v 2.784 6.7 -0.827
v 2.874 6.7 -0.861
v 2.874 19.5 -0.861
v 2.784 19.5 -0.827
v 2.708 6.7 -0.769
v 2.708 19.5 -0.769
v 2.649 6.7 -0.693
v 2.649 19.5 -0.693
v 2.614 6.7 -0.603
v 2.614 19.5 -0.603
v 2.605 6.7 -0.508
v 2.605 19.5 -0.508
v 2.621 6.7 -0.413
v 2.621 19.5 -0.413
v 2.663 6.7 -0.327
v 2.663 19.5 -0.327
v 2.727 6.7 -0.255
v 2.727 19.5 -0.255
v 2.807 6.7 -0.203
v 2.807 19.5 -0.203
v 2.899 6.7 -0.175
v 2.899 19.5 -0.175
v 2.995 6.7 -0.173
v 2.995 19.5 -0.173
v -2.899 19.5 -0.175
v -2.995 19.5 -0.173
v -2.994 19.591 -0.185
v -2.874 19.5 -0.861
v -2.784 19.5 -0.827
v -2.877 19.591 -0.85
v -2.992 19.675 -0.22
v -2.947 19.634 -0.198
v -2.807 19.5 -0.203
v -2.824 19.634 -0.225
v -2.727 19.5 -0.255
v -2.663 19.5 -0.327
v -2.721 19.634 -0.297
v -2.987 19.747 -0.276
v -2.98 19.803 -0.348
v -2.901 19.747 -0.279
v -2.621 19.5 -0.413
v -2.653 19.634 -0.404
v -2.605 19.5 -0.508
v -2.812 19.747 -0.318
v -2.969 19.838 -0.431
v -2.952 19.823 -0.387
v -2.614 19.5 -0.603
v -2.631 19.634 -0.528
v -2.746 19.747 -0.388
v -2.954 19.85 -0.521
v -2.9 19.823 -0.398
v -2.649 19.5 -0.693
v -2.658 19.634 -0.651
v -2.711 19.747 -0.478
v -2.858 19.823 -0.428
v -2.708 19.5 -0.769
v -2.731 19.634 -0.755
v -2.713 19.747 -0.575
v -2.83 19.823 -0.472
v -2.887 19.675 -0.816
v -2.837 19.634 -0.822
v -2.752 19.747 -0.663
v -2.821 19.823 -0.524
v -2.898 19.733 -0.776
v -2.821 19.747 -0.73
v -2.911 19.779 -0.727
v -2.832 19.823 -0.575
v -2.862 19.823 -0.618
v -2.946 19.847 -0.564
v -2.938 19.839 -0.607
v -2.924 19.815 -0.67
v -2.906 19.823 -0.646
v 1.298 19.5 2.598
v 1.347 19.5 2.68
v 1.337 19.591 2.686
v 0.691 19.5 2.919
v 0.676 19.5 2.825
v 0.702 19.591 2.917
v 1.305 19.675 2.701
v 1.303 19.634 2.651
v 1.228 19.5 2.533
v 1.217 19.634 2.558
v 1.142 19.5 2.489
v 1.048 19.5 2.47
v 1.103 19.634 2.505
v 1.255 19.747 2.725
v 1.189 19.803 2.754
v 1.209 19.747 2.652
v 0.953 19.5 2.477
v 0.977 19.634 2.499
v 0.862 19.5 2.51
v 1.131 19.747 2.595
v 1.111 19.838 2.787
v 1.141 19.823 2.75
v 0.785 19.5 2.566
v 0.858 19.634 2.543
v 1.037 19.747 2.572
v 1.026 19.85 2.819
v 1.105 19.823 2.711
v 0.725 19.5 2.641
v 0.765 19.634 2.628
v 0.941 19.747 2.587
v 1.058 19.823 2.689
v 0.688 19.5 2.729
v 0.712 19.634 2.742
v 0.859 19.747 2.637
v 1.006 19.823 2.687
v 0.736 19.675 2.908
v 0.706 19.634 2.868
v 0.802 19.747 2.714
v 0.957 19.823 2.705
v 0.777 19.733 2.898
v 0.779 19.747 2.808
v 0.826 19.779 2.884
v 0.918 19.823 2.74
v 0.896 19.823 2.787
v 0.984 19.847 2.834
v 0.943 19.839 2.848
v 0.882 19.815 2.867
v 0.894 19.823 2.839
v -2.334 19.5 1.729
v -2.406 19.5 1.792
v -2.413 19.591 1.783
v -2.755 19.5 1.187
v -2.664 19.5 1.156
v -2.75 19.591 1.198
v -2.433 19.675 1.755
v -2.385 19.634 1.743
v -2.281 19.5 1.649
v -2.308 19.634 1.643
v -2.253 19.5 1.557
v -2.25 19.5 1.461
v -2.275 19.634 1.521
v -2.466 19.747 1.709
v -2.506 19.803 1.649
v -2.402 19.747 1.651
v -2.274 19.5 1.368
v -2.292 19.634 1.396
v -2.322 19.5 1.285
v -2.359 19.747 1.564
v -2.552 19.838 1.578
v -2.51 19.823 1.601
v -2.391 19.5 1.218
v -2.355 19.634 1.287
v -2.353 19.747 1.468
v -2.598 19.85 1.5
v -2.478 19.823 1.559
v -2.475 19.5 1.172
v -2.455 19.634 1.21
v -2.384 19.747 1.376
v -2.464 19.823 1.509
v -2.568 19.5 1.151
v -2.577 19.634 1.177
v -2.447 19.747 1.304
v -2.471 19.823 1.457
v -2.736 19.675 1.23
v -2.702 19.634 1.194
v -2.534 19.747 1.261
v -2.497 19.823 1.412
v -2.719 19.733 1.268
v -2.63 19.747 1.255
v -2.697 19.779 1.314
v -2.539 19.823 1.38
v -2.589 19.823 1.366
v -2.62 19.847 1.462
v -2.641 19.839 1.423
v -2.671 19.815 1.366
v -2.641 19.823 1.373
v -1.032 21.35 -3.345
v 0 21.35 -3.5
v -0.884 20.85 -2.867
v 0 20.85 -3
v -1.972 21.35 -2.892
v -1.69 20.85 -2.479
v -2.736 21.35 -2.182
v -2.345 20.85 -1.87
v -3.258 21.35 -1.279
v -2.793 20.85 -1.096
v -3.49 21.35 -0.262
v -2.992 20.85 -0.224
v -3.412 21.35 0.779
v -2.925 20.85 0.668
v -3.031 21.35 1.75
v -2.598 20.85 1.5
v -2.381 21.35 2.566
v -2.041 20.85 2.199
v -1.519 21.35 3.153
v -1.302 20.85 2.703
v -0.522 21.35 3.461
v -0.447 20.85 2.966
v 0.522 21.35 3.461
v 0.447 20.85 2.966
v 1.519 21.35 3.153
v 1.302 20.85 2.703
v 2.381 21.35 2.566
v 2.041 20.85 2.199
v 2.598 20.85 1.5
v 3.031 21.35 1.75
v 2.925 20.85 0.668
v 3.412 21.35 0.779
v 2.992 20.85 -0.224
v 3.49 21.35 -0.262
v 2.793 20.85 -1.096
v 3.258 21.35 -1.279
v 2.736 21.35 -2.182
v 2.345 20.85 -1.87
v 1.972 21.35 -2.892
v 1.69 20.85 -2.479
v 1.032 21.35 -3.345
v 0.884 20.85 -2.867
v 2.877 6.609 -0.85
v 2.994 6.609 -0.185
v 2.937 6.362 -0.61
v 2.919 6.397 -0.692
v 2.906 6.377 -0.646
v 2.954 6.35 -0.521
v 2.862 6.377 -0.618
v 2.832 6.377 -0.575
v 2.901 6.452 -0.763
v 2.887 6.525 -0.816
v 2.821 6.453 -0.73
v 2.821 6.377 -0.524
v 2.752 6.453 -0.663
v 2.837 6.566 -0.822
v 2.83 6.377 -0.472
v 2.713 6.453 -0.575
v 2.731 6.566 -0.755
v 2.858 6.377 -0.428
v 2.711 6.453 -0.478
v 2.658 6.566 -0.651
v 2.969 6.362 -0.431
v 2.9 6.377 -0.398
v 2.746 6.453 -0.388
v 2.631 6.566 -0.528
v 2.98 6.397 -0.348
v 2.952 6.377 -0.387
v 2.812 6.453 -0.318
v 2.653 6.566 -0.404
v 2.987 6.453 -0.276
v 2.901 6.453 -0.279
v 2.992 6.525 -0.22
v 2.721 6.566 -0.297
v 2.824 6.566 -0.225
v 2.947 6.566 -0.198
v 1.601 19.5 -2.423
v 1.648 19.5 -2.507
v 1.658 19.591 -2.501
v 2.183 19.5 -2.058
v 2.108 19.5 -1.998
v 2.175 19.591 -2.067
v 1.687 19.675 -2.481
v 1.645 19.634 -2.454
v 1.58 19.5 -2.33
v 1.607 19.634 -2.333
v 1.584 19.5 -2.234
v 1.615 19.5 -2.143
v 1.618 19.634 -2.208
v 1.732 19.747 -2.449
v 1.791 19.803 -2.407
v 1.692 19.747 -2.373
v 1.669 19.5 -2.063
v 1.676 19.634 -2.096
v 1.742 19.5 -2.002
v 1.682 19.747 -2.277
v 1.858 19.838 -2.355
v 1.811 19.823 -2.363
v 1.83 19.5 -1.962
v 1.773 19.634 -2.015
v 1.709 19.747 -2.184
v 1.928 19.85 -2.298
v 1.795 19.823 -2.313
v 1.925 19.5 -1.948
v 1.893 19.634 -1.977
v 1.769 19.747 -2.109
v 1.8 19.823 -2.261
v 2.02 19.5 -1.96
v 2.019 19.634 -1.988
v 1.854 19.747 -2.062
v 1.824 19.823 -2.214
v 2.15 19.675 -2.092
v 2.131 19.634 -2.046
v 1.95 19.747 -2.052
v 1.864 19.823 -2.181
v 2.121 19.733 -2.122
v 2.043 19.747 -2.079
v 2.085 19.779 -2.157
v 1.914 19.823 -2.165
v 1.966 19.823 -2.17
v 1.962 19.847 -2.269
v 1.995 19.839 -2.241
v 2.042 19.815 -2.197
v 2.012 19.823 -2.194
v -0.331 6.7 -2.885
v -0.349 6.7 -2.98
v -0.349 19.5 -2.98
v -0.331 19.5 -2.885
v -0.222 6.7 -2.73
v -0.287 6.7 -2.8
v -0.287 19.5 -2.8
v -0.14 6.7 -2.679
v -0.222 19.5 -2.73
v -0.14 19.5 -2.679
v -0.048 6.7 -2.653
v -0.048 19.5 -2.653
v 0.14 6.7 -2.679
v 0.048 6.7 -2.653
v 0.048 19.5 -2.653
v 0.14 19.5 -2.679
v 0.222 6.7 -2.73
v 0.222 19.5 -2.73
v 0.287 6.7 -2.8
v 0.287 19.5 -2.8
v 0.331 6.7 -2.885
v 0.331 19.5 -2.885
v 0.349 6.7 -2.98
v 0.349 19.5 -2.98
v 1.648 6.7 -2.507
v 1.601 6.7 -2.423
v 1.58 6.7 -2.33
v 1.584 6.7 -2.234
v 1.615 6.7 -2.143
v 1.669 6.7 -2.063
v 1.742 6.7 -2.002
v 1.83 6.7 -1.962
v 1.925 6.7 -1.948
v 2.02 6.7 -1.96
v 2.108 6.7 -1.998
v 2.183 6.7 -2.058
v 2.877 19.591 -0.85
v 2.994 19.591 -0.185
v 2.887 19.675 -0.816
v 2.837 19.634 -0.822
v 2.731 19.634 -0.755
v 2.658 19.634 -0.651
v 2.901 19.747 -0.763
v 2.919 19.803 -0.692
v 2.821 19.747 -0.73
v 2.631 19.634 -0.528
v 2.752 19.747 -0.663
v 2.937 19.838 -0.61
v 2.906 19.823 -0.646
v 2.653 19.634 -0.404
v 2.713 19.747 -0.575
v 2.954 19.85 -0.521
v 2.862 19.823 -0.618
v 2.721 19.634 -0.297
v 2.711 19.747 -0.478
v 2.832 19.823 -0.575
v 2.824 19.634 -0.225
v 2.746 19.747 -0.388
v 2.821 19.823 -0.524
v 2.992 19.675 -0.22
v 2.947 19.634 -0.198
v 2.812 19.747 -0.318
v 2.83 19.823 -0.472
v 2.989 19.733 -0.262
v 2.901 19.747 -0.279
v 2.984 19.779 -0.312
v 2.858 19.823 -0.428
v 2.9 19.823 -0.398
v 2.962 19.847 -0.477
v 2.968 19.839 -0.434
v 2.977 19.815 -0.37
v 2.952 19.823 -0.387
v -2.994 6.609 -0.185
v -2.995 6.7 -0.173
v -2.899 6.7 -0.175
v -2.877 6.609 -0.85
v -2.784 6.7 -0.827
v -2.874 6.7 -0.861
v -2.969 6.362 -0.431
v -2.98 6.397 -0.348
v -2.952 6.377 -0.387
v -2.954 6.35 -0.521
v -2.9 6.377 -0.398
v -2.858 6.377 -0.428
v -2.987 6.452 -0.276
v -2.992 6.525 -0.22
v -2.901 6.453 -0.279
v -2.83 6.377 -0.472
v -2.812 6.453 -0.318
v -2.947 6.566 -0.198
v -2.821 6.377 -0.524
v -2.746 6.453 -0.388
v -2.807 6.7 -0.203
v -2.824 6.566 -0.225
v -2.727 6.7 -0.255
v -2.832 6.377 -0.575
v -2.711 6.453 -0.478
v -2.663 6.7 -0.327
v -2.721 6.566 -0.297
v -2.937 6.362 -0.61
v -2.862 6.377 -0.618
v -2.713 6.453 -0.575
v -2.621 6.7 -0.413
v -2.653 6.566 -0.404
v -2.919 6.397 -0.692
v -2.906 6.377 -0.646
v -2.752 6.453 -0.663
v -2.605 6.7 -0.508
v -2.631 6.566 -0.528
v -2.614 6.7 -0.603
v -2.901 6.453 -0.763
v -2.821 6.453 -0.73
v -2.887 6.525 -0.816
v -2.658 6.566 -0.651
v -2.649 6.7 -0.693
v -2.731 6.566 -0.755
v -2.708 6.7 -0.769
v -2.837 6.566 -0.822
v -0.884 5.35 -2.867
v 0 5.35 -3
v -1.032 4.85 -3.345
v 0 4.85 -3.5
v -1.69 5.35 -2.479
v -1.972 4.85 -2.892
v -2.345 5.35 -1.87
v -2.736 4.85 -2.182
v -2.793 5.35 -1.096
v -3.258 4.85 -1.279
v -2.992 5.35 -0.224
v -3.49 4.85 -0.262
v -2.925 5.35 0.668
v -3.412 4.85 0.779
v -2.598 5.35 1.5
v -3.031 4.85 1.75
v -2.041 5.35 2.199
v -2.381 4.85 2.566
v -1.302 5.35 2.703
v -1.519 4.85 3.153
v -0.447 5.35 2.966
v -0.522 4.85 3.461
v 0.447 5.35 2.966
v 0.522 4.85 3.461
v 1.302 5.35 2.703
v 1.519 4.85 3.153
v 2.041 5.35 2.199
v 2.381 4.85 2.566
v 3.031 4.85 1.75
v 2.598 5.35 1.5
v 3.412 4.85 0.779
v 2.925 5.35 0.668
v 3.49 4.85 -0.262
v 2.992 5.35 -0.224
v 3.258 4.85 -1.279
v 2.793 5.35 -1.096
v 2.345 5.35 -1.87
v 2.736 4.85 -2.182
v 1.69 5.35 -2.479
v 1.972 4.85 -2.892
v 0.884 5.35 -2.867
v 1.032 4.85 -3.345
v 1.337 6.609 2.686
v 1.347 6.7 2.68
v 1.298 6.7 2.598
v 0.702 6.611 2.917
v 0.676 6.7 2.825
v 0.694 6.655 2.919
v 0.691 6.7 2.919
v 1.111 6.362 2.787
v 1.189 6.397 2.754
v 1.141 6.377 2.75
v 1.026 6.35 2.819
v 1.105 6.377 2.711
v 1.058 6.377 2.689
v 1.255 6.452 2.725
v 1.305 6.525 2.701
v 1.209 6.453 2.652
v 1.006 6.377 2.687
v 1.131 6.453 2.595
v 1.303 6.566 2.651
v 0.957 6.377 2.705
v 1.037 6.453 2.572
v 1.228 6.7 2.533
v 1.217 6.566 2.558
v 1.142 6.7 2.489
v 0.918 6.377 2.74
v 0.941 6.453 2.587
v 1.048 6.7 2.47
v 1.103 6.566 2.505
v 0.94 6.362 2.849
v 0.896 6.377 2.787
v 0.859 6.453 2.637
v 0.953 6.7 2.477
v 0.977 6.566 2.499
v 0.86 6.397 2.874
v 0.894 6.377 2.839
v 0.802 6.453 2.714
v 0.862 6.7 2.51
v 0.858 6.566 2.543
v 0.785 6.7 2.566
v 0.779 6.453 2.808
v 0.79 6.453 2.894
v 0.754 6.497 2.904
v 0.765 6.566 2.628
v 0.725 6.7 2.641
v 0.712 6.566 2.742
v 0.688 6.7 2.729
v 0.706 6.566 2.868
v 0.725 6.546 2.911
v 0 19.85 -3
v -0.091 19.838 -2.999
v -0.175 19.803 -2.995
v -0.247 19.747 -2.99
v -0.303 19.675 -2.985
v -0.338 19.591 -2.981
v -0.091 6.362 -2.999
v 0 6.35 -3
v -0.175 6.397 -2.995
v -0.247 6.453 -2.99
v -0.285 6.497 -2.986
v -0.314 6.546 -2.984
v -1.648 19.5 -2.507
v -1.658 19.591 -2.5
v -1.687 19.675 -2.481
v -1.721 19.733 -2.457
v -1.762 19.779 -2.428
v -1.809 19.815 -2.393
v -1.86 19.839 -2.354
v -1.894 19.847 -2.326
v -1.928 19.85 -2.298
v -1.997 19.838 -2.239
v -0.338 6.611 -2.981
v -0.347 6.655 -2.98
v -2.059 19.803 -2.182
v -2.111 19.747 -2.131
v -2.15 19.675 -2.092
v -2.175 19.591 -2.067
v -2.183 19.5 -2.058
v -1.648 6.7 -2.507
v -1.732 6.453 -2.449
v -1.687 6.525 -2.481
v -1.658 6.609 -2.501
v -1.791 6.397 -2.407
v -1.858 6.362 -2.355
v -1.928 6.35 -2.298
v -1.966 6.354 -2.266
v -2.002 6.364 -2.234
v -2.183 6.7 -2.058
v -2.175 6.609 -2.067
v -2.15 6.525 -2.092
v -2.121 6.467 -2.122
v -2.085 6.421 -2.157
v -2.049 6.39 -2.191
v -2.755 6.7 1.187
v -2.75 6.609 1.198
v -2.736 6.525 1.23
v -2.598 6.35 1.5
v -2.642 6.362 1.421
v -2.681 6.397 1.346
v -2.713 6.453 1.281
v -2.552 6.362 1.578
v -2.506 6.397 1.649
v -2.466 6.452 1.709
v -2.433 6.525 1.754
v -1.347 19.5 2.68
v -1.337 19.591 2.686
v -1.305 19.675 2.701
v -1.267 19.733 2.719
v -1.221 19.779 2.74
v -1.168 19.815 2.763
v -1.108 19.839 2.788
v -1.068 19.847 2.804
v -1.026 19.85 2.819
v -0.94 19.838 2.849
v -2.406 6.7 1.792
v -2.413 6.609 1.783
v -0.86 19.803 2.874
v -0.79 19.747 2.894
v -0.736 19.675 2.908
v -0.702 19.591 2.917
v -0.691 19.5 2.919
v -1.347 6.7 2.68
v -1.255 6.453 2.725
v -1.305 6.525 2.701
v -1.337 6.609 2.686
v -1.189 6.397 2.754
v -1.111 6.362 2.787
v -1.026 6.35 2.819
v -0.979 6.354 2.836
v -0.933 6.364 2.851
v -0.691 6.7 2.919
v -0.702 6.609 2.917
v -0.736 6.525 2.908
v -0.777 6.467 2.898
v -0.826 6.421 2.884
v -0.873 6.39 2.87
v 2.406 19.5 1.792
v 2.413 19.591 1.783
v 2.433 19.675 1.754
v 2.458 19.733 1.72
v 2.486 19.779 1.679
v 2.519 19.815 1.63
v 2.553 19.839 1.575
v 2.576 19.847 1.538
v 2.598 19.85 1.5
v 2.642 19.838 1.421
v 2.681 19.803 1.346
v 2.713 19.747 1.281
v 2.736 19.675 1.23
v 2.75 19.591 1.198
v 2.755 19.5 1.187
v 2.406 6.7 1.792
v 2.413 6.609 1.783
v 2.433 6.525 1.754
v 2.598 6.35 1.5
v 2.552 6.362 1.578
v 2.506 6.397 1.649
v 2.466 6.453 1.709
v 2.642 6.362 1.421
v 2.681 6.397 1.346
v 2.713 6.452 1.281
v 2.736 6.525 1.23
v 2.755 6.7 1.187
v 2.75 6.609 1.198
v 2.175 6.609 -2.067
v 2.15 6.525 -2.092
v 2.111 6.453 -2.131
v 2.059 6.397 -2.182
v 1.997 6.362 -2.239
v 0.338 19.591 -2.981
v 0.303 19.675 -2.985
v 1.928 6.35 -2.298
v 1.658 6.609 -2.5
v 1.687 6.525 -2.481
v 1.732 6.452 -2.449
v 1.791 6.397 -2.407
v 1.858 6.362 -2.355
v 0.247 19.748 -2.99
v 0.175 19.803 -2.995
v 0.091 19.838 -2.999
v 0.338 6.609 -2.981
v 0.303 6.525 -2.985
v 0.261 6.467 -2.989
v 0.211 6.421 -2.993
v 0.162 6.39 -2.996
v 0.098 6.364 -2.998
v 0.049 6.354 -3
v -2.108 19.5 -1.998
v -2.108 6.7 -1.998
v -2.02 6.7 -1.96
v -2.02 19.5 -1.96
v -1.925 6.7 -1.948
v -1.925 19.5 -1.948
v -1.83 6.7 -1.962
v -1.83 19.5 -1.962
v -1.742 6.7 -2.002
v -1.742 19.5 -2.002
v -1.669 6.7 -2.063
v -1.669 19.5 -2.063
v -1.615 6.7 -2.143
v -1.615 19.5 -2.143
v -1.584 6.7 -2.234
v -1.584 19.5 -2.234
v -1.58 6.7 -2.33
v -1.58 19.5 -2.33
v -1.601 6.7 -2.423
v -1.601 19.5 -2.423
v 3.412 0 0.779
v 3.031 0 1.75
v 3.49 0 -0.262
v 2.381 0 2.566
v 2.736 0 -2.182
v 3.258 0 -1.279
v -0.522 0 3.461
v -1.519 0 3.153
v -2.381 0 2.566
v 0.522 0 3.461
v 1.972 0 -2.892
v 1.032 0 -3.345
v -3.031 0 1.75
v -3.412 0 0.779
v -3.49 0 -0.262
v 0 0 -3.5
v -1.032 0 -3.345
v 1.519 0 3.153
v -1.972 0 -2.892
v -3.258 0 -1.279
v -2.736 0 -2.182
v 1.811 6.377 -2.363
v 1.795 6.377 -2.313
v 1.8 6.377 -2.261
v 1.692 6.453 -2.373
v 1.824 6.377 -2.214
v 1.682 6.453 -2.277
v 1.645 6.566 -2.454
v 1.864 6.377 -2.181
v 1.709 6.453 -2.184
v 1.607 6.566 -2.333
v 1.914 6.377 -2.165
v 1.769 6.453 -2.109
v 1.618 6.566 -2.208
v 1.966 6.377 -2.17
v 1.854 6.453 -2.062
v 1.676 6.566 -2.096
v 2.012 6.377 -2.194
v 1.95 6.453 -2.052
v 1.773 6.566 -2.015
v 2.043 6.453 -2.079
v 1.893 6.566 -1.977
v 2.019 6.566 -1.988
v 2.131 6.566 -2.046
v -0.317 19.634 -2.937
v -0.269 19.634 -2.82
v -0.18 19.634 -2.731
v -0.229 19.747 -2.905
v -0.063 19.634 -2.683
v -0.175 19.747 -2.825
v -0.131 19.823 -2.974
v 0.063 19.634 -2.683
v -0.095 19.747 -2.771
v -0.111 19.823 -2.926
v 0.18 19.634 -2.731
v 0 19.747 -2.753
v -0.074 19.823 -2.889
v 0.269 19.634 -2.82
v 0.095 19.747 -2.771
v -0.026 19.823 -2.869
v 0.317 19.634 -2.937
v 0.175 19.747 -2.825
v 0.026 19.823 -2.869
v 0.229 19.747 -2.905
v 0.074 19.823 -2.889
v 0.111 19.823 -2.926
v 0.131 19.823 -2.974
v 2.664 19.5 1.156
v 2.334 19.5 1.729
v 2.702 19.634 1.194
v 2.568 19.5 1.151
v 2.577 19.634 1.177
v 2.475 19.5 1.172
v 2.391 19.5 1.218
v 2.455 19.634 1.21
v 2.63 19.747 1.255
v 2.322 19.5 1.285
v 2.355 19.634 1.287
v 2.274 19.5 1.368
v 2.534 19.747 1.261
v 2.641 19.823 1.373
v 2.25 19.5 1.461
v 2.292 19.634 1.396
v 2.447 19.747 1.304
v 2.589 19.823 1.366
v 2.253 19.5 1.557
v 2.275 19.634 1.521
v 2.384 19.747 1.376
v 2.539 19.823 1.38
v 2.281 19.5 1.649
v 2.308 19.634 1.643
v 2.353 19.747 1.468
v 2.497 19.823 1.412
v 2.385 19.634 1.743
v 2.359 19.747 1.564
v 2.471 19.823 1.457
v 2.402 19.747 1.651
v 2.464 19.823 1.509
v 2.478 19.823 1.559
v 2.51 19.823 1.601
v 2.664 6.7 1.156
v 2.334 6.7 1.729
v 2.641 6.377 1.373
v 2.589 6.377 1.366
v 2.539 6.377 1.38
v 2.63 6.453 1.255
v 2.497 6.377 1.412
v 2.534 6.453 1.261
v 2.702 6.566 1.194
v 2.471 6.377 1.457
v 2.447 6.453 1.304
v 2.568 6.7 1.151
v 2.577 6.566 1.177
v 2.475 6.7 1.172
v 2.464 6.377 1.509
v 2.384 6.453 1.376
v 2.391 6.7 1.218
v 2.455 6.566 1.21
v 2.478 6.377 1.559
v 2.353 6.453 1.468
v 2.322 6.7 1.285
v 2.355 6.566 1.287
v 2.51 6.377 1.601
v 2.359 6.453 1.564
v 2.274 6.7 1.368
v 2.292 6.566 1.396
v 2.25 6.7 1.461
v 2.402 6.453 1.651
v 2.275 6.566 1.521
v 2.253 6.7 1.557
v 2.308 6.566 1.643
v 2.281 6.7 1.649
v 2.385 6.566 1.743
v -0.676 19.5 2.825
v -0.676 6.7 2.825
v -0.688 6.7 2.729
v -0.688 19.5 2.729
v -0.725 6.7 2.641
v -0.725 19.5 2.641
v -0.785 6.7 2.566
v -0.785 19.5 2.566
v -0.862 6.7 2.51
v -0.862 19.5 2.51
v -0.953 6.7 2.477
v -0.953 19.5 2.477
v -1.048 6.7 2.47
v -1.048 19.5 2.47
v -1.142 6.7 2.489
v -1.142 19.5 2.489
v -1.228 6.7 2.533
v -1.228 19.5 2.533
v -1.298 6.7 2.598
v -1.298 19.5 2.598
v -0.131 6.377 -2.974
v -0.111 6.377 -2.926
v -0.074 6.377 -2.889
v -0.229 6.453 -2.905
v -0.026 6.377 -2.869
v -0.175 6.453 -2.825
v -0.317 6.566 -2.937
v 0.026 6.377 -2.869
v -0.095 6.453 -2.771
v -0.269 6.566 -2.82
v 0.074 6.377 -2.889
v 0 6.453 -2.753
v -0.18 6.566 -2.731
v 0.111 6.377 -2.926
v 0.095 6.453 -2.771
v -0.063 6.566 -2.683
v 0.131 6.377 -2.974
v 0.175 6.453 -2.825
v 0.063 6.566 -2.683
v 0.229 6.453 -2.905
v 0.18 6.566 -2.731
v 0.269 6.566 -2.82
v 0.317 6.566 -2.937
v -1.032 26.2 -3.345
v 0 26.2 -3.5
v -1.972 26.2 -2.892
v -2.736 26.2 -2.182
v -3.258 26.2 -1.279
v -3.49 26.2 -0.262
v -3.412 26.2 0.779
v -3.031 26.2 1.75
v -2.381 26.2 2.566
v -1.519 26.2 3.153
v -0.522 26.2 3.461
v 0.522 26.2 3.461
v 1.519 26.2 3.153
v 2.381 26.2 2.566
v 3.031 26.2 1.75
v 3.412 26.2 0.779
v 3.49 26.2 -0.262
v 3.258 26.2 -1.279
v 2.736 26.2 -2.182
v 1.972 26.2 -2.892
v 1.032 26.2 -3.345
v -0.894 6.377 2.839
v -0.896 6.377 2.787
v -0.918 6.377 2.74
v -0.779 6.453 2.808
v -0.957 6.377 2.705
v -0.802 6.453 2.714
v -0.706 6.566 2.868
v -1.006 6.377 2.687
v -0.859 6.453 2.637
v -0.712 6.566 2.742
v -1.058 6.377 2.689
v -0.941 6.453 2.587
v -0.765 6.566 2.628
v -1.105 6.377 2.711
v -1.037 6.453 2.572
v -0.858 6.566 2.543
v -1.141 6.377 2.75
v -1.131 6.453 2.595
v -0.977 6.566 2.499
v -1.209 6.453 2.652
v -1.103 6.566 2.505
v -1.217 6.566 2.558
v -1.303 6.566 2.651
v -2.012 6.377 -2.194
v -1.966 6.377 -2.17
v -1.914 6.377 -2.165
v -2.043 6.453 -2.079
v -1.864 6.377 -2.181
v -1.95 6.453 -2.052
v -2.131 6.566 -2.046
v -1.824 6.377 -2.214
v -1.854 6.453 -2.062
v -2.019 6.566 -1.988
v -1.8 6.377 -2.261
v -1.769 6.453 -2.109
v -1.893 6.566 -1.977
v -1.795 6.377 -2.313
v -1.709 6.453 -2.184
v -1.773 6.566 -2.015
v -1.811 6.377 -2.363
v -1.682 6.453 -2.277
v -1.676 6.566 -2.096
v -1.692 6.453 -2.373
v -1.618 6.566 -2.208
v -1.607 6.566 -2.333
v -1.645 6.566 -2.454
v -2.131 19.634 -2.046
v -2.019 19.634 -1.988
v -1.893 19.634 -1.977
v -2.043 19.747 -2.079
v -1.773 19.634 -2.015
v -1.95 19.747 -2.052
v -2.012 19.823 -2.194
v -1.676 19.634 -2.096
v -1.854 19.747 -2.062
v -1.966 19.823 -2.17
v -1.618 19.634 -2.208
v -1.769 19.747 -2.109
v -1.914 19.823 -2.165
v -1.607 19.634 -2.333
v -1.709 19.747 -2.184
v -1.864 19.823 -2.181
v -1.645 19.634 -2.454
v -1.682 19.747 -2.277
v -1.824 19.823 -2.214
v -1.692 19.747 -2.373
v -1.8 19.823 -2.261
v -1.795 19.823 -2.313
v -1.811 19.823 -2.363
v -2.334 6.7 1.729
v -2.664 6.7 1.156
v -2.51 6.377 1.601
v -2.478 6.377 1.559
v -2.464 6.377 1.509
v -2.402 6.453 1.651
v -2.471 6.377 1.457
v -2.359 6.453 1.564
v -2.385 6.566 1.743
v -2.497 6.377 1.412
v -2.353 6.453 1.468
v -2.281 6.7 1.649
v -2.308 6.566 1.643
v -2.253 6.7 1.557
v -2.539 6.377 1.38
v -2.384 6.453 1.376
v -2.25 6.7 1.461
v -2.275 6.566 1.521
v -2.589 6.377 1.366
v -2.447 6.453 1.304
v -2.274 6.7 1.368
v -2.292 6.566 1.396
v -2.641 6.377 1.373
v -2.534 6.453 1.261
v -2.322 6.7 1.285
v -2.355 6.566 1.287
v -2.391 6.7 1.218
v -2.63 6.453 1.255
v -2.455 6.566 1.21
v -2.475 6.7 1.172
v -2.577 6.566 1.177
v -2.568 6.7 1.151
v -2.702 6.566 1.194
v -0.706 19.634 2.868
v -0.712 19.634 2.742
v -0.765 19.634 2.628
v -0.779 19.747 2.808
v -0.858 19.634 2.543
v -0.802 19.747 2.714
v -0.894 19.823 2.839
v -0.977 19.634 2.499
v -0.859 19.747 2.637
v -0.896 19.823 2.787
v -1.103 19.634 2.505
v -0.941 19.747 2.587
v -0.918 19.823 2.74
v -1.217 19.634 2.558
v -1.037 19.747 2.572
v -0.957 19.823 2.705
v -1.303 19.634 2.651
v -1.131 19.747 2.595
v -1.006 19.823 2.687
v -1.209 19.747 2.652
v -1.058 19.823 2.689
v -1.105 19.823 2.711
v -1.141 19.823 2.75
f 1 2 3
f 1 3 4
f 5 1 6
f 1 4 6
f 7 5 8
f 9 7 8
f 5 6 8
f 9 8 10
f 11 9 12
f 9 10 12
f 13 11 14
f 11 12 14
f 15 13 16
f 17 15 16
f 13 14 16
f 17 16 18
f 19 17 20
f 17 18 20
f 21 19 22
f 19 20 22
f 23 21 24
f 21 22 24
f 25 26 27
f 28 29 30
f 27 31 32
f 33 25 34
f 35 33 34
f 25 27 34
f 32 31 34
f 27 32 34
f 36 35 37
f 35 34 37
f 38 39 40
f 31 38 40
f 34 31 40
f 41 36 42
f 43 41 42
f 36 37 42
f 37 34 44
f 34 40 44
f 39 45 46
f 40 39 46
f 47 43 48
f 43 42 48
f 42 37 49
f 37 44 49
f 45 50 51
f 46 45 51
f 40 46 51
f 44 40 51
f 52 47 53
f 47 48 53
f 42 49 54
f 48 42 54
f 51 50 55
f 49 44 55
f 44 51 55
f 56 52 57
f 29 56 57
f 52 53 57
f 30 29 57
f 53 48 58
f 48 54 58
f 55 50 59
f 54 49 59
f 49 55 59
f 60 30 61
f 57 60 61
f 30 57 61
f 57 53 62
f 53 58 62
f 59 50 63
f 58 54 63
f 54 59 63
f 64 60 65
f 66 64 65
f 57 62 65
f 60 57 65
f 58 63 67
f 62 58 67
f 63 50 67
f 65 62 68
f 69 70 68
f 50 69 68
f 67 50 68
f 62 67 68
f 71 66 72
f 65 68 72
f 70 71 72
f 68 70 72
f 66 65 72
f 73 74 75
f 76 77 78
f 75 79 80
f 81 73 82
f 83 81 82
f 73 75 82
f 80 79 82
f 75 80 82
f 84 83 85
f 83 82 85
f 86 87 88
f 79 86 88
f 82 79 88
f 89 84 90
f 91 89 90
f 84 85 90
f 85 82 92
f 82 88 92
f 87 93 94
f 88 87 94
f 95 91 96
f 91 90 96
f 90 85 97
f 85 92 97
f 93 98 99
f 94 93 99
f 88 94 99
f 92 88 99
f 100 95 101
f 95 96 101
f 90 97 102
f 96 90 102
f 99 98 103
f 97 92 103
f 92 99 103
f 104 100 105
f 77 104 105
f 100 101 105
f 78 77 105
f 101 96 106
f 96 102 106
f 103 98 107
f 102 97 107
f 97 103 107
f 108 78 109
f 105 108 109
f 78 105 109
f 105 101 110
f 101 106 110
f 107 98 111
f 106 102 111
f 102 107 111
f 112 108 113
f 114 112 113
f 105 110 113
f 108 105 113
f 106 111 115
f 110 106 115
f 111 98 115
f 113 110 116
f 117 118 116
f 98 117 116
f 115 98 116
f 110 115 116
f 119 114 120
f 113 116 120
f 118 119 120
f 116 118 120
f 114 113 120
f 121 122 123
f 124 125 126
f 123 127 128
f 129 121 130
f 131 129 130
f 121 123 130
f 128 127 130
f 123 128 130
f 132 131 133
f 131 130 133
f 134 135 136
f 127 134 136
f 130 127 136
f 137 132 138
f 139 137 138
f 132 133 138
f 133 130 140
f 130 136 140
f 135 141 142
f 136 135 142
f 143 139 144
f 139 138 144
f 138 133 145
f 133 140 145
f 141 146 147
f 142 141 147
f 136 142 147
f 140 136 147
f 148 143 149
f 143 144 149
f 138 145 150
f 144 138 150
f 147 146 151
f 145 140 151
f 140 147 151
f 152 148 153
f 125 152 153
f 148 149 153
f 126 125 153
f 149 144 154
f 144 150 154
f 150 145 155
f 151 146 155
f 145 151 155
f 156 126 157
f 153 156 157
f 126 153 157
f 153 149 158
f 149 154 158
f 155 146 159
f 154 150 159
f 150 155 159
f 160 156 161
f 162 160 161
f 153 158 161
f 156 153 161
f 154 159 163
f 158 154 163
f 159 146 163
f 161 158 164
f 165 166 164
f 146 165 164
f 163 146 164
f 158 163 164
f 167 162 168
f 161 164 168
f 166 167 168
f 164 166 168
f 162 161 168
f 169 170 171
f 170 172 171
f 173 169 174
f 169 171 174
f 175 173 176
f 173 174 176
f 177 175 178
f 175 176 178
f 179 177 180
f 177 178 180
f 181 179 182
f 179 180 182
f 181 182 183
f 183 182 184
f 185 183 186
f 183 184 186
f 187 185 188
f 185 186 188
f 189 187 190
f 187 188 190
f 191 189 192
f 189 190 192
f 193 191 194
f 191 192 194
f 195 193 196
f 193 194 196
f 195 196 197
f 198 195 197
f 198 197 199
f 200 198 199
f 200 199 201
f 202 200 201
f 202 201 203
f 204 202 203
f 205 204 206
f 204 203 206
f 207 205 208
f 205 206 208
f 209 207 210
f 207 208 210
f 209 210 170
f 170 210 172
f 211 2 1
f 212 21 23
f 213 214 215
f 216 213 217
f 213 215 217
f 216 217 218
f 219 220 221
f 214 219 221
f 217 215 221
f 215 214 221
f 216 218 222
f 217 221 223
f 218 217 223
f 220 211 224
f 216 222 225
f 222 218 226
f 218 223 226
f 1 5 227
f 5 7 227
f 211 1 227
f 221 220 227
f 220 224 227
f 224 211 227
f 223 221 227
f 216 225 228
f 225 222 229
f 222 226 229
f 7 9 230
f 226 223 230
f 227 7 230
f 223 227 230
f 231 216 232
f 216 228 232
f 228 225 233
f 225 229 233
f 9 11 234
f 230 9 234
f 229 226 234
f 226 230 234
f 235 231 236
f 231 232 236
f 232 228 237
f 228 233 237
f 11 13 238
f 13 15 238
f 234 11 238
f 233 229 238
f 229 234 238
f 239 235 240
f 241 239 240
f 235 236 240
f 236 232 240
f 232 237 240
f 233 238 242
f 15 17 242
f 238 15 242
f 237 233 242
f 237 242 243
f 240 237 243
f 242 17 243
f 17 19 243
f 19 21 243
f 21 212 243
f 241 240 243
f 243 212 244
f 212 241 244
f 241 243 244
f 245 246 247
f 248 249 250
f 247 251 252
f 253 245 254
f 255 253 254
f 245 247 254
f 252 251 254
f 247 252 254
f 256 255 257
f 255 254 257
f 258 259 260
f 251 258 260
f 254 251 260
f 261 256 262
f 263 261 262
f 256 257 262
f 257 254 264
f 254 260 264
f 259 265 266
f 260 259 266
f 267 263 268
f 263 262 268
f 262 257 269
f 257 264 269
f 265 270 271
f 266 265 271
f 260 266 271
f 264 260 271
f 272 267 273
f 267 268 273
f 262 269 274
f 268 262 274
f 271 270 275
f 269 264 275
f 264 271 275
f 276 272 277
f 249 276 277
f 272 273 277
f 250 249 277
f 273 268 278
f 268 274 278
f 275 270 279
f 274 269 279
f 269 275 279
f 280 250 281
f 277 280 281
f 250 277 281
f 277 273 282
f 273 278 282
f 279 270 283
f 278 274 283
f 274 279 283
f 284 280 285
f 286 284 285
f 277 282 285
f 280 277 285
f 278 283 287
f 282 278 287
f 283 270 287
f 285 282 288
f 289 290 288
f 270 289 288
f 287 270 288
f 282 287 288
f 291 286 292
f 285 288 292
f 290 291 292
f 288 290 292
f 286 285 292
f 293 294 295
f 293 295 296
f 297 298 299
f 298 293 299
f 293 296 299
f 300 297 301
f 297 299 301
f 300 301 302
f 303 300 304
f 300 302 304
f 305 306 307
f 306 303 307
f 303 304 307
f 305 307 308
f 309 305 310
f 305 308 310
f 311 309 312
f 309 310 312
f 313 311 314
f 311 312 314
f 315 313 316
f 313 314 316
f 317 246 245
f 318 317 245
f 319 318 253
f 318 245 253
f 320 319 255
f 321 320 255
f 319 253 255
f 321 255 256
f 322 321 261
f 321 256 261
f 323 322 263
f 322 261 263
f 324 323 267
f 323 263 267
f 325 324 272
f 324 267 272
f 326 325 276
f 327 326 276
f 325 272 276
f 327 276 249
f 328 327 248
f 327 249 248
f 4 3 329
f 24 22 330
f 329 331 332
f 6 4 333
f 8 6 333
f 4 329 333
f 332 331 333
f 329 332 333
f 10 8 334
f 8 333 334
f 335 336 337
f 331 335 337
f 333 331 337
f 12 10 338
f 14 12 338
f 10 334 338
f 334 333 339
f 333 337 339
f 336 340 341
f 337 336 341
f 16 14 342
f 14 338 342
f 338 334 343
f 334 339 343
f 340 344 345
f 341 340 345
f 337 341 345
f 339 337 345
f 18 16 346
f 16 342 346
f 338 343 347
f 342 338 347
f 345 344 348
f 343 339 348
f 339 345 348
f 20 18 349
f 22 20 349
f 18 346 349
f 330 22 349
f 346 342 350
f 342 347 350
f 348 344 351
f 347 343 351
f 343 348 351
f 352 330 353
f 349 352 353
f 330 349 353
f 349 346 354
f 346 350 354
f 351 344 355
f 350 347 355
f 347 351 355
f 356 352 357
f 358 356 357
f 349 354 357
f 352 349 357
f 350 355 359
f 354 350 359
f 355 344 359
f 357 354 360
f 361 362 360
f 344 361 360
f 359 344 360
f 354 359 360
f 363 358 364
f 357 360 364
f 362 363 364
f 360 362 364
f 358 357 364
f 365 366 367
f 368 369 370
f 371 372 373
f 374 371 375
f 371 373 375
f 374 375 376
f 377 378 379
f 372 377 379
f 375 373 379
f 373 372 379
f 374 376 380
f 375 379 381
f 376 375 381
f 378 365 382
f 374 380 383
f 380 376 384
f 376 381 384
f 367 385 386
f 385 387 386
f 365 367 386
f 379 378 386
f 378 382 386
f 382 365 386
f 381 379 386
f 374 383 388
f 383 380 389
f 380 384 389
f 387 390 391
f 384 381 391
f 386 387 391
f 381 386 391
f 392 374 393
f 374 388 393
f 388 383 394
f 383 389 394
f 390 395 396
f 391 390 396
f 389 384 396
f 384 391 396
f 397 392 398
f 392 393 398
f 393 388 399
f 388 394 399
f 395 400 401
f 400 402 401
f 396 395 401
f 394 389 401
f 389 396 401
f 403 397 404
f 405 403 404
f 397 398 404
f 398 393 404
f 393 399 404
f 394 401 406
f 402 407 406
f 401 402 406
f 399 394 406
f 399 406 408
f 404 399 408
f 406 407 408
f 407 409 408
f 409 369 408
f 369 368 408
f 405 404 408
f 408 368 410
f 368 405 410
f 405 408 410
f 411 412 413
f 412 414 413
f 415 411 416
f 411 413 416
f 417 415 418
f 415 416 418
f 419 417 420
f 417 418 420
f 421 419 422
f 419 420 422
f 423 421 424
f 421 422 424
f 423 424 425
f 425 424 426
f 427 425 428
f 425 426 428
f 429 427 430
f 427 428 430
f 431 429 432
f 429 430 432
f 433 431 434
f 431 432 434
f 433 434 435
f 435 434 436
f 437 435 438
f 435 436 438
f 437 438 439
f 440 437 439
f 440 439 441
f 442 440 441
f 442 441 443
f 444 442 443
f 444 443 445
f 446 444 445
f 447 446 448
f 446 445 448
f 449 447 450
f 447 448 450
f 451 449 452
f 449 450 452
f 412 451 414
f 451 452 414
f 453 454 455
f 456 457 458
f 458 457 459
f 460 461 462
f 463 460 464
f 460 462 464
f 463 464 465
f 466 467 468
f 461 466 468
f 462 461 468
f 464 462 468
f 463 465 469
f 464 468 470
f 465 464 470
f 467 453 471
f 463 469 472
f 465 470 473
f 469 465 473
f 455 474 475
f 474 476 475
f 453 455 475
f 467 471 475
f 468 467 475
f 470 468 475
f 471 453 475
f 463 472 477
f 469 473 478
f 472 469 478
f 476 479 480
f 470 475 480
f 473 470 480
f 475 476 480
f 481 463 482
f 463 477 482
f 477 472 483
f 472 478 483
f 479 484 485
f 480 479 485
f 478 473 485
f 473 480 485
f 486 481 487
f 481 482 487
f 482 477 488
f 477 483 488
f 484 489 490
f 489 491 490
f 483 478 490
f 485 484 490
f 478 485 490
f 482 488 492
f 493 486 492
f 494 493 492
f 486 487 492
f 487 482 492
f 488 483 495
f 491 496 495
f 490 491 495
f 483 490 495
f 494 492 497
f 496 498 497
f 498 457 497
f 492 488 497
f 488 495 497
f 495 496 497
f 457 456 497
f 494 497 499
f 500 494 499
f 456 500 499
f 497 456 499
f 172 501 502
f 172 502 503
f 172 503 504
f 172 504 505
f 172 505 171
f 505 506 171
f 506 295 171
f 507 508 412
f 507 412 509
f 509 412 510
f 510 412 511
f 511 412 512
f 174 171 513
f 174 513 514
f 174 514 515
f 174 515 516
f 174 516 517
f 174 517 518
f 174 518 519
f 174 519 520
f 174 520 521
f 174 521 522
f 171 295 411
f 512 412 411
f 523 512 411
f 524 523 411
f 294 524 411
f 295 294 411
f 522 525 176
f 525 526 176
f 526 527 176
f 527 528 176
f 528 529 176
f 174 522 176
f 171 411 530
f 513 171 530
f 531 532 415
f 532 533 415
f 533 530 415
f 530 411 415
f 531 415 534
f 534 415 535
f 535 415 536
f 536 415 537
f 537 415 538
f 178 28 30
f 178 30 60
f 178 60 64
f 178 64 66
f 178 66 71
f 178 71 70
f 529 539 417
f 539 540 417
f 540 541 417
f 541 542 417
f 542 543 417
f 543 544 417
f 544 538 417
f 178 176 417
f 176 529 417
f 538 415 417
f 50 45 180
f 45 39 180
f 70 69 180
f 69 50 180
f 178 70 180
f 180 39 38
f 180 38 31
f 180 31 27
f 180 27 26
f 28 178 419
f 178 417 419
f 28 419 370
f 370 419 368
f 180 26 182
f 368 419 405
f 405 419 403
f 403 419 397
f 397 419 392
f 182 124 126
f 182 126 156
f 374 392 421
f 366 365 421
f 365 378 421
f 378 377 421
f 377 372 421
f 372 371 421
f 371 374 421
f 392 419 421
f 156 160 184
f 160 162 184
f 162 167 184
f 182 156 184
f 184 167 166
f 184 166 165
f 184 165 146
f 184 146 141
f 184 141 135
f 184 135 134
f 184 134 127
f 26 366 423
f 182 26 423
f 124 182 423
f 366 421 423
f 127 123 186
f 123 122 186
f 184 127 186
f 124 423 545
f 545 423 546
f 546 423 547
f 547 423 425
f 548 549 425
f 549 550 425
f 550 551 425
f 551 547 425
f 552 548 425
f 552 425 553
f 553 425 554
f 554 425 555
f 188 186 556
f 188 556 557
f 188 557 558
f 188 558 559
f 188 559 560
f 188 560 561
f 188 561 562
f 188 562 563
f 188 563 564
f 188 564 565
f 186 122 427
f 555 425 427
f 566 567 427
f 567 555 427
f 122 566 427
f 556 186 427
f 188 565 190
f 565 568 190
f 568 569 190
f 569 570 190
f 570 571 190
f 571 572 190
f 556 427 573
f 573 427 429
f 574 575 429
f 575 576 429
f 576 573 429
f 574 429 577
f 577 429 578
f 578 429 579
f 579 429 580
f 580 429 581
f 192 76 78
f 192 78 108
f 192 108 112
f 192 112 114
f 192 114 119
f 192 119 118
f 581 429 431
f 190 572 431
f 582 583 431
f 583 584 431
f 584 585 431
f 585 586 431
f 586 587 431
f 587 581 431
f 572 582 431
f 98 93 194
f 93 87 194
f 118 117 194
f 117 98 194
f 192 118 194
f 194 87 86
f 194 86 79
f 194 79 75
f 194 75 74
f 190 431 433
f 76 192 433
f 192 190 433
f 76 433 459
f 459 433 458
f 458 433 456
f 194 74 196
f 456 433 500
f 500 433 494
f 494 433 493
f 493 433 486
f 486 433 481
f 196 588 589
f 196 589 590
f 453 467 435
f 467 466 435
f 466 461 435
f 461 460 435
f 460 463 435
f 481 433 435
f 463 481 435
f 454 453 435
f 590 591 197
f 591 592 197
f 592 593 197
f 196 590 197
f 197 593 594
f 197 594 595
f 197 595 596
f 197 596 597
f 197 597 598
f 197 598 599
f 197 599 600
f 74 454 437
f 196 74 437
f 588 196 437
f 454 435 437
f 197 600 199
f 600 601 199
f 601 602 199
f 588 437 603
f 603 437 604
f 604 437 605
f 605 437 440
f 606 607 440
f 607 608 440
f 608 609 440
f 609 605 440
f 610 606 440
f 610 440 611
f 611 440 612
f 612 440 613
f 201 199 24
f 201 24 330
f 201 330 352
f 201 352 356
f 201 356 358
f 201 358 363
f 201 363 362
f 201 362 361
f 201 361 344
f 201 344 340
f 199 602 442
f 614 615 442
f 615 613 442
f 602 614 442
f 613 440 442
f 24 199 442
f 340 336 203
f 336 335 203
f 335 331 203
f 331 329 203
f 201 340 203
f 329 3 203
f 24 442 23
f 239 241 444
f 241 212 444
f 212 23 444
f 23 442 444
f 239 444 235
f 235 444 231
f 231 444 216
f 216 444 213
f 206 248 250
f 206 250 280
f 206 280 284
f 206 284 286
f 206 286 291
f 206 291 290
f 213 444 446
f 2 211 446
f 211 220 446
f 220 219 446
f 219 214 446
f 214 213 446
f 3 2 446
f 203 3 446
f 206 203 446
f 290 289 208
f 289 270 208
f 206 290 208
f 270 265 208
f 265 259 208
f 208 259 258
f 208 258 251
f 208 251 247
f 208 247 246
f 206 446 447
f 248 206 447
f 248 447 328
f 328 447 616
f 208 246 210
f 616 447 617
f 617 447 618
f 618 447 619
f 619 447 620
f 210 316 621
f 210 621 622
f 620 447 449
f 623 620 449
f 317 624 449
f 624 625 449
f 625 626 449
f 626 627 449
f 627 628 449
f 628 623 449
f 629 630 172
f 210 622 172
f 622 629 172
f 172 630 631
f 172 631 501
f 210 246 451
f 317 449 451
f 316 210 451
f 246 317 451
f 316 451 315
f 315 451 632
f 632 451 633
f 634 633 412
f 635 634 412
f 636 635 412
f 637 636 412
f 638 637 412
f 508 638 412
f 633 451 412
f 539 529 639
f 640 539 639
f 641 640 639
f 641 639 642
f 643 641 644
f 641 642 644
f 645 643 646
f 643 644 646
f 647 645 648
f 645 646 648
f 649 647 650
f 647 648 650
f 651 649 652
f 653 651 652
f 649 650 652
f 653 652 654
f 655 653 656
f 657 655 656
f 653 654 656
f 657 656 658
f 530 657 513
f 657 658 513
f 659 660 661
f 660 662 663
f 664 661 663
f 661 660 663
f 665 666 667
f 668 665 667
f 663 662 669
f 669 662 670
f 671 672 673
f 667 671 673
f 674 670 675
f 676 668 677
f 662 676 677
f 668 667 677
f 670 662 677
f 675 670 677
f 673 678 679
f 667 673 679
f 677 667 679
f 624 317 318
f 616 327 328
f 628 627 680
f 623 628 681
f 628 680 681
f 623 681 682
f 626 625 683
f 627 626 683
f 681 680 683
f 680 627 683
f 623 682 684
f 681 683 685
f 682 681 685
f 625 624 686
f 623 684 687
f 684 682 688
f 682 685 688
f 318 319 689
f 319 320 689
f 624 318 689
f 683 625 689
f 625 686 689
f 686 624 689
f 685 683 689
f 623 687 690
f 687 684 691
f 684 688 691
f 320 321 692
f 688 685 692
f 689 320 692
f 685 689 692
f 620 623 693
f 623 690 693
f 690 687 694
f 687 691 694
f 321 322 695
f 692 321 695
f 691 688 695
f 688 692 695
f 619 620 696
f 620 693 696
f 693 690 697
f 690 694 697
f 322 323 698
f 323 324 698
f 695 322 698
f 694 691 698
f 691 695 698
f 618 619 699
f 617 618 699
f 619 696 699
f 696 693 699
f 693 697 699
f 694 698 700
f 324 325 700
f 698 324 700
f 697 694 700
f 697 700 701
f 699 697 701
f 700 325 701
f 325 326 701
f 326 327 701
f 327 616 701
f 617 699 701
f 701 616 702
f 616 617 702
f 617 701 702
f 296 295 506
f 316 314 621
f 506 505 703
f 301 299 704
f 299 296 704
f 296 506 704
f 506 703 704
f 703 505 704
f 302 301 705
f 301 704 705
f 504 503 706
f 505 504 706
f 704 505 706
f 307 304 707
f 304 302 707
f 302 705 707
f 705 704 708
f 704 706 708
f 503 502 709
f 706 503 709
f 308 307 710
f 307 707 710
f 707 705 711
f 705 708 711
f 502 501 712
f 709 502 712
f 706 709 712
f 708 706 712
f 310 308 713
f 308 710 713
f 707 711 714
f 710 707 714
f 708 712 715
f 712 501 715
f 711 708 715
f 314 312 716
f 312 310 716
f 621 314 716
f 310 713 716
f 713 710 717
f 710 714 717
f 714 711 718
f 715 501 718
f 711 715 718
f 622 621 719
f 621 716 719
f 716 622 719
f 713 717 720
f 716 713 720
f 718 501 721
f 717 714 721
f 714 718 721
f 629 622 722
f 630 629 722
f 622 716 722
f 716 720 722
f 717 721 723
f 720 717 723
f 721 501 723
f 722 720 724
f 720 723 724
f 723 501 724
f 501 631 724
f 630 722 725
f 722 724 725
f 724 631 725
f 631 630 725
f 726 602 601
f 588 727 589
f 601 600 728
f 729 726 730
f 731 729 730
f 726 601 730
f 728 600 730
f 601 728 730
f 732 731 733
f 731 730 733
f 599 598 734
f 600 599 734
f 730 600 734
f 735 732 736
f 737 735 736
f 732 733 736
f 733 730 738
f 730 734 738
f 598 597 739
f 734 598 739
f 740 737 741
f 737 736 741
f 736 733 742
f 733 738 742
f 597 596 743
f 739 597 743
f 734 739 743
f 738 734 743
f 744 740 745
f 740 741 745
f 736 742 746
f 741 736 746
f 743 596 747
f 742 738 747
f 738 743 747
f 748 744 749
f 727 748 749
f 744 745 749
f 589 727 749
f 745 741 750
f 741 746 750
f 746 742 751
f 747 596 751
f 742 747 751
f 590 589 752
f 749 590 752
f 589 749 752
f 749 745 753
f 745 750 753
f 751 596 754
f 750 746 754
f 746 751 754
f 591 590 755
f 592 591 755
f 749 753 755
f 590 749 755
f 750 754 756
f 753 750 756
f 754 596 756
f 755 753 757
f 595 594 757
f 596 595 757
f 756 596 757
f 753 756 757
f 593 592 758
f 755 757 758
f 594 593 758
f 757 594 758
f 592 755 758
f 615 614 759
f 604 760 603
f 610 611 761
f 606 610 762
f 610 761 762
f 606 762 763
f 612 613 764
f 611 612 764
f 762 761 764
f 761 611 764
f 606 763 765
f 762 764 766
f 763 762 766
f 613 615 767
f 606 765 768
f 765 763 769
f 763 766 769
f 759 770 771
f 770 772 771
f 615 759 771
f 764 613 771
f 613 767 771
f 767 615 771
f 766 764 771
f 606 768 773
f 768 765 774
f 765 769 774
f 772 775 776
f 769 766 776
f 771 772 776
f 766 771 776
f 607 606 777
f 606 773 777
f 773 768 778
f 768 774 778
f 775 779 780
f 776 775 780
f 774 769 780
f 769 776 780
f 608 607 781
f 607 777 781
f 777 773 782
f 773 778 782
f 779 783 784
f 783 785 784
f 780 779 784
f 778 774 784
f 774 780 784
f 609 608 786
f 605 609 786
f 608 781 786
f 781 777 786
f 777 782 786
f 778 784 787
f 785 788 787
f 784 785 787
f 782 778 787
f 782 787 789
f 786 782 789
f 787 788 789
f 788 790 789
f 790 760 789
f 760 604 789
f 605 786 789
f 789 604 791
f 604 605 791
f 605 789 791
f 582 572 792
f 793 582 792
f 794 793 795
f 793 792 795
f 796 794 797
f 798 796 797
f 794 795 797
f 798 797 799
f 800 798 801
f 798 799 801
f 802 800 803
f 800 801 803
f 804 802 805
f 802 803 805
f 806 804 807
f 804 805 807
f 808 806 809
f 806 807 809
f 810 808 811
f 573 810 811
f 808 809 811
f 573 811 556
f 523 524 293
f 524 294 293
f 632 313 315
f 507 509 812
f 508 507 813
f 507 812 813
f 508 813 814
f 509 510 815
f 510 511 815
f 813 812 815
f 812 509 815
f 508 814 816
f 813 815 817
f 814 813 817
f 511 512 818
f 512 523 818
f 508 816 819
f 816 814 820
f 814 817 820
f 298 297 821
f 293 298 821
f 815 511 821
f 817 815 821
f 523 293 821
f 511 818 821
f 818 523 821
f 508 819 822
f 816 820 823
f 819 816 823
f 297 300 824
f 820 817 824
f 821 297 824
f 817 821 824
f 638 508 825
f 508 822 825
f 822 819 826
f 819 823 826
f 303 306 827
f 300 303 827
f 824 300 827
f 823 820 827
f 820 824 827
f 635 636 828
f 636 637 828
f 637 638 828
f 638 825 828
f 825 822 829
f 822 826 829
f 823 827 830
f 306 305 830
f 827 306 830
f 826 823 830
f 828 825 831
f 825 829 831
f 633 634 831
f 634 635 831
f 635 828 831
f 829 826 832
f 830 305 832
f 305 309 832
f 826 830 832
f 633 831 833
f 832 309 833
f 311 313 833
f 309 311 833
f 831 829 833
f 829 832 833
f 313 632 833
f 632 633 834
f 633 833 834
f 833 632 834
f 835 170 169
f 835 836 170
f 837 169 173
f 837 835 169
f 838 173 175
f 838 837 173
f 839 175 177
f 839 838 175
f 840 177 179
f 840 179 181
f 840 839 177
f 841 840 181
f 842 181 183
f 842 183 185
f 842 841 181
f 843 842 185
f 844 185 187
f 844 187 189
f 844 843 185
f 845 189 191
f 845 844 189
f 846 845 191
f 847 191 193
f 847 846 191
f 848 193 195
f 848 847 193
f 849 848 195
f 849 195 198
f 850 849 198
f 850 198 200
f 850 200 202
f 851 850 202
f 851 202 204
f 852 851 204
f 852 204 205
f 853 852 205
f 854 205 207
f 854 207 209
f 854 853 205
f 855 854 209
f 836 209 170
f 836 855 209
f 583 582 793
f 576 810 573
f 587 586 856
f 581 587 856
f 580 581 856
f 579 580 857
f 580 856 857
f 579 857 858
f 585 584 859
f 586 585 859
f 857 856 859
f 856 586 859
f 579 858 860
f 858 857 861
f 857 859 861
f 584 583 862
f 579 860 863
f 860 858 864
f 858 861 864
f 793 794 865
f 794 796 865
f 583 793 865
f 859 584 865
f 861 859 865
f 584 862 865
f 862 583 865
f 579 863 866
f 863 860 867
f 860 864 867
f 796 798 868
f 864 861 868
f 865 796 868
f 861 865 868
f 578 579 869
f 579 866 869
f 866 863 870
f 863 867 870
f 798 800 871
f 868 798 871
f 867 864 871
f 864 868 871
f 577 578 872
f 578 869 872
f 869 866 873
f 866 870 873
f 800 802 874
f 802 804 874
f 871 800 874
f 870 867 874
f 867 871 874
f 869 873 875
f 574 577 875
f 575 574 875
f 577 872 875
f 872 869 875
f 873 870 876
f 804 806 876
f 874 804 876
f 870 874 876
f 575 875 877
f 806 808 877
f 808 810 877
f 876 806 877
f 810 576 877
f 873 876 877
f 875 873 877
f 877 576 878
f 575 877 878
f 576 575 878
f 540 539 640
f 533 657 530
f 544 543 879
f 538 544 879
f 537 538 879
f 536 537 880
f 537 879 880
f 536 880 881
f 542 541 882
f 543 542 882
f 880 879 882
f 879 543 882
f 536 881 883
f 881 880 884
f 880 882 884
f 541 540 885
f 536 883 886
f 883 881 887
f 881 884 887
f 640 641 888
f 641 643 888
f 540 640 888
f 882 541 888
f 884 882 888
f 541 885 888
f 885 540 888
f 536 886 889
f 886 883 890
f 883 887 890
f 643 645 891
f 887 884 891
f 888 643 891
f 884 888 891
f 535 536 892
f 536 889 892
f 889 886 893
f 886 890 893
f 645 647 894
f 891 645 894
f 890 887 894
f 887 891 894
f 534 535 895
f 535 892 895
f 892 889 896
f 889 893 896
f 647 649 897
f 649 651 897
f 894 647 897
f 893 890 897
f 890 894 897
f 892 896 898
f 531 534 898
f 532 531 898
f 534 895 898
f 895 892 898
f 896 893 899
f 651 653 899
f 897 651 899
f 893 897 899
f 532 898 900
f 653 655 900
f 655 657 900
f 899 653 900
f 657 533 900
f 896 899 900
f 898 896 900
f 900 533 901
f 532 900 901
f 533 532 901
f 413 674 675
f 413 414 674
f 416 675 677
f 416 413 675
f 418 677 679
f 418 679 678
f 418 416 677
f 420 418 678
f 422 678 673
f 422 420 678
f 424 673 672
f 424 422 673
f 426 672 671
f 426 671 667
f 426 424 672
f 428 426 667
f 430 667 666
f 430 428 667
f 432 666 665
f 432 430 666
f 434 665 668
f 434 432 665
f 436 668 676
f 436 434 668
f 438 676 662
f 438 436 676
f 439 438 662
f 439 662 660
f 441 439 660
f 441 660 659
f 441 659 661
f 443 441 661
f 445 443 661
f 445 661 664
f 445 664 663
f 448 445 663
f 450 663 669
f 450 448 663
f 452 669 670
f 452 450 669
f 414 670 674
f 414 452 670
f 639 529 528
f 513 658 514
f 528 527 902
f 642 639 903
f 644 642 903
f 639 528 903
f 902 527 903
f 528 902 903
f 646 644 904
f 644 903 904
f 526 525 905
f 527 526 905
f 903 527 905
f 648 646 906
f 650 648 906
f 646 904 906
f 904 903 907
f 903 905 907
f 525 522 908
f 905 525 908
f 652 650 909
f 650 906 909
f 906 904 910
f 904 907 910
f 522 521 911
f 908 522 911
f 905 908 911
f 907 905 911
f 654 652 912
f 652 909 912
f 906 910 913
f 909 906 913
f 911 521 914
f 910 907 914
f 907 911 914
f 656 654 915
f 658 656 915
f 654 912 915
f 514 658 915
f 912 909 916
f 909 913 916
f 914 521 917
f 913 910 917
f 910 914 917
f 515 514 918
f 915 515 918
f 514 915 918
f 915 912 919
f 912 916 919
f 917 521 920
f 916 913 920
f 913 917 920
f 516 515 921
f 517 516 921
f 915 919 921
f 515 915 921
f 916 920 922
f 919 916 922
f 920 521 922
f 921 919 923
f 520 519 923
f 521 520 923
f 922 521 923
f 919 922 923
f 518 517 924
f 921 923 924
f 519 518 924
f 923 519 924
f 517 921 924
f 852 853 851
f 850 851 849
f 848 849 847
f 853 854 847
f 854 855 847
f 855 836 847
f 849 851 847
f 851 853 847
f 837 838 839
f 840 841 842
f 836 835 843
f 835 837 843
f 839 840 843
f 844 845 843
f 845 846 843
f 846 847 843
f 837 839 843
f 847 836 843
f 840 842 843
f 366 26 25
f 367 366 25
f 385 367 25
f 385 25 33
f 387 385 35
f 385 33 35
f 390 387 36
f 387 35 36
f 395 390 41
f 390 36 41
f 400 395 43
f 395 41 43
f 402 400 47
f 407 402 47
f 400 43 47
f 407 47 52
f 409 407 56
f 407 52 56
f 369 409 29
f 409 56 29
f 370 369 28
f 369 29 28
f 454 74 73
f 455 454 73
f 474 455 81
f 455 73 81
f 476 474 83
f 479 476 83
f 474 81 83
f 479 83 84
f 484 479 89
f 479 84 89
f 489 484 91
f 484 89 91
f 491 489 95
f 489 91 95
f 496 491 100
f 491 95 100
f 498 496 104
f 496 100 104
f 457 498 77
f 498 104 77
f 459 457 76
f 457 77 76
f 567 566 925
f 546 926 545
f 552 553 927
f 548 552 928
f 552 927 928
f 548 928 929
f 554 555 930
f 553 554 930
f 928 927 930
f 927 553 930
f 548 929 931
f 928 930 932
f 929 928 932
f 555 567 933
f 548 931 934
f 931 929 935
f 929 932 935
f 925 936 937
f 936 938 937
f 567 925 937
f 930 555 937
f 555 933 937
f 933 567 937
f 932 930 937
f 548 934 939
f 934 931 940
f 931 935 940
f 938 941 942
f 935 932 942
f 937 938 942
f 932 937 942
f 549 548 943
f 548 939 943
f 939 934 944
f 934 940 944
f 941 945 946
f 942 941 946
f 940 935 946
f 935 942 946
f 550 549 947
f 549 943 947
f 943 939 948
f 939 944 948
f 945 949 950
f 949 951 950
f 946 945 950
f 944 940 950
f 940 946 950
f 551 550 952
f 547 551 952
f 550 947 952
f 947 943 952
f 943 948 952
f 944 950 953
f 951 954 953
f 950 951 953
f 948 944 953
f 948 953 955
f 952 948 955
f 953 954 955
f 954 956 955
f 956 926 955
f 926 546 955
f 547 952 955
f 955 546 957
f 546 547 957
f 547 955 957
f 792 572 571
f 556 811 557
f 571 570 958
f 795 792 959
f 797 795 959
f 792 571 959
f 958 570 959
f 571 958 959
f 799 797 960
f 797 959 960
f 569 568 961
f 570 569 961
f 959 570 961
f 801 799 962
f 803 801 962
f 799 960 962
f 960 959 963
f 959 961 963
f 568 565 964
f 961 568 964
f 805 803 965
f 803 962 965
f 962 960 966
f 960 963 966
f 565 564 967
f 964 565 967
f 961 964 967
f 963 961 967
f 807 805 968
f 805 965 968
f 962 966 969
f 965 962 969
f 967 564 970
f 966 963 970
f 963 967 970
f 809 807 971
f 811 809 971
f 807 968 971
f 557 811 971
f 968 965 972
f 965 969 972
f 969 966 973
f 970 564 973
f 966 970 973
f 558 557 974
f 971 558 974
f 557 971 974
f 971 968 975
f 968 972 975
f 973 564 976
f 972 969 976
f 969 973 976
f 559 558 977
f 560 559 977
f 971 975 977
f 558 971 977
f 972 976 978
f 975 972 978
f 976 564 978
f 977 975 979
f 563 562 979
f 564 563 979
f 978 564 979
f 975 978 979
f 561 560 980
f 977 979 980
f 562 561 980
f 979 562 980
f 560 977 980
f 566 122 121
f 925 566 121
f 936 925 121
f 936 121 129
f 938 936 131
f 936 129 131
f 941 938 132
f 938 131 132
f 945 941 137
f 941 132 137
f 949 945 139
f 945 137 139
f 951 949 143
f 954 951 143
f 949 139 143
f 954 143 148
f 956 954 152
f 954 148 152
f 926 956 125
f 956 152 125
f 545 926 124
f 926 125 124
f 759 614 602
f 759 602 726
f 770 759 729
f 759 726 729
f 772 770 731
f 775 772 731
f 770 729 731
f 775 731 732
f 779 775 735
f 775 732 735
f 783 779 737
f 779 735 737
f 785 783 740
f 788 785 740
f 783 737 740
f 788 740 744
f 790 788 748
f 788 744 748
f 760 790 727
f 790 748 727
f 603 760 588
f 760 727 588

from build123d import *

# Parameters (mm, degrees)
COLUMN_CIRCULAR_PATTERN_CUT_COUNT = 9


with BuildPart() as part:
    # Sketch1 → Main Support Pole (revolve)
    with BuildSketch(Plane.XY, mode=Mode.PRIVATE) as main_support_pole_sk:
        Polygon((0, 0), (0, 26.2), (3.5, 26.2), (3.5, 23.35), (3.5, 21.35), (3, 20.85), (3, 5.35), (3.5, 4.85), (3.5, 2.85), (3.5, 0), align=None)
    revolve(main_support_pole_sk.sketch.rotate(Axis((0, 26.2, 0), (0, 1, 0)), 90), axis=Axis((0, 26.2, 0), (0, 1, 0)))

    # Sketch2 → Column Cut (revolve, cut)
    with BuildSketch(Plane(origin=(0, 0, 0), x_dir=(0, 0, -1), z_dir=(1, 0, 0))):
        with BuildLine():
            Line((3, 19.85), (3, 6.35))
            ThreePointArc((3, 6.35), (2.752512627, 6.452512627), (2.65, 6.7))
            Line((2.65, 6.7), (2.65, 19.5))
            ThreePointArc((2.65, 19.5), (2.752512627, 19.747487373), (3, 19.85))
        make_face()
    column_cut = revolve(axis=Axis((0, 19.85, -3), (0, 1, 0)), mode=Mode.SUBTRACT)

    # Column Circular Pattern Cut: Column Cut ×9 about axis
    column_circular_pattern_cut_axis = Axis((0, 0, 0), (0, 1, 0))
    for i in range(1, COLUMN_CIRCULAR_PATTERN_CUT_COUNT):
        add(column_cut.rotate(column_circular_pattern_cut_axis, i * 360 / COLUMN_CIRCULAR_PATTERN_CUT_COUNT), mode=Mode.SUBTRACT)


solid = part.part
